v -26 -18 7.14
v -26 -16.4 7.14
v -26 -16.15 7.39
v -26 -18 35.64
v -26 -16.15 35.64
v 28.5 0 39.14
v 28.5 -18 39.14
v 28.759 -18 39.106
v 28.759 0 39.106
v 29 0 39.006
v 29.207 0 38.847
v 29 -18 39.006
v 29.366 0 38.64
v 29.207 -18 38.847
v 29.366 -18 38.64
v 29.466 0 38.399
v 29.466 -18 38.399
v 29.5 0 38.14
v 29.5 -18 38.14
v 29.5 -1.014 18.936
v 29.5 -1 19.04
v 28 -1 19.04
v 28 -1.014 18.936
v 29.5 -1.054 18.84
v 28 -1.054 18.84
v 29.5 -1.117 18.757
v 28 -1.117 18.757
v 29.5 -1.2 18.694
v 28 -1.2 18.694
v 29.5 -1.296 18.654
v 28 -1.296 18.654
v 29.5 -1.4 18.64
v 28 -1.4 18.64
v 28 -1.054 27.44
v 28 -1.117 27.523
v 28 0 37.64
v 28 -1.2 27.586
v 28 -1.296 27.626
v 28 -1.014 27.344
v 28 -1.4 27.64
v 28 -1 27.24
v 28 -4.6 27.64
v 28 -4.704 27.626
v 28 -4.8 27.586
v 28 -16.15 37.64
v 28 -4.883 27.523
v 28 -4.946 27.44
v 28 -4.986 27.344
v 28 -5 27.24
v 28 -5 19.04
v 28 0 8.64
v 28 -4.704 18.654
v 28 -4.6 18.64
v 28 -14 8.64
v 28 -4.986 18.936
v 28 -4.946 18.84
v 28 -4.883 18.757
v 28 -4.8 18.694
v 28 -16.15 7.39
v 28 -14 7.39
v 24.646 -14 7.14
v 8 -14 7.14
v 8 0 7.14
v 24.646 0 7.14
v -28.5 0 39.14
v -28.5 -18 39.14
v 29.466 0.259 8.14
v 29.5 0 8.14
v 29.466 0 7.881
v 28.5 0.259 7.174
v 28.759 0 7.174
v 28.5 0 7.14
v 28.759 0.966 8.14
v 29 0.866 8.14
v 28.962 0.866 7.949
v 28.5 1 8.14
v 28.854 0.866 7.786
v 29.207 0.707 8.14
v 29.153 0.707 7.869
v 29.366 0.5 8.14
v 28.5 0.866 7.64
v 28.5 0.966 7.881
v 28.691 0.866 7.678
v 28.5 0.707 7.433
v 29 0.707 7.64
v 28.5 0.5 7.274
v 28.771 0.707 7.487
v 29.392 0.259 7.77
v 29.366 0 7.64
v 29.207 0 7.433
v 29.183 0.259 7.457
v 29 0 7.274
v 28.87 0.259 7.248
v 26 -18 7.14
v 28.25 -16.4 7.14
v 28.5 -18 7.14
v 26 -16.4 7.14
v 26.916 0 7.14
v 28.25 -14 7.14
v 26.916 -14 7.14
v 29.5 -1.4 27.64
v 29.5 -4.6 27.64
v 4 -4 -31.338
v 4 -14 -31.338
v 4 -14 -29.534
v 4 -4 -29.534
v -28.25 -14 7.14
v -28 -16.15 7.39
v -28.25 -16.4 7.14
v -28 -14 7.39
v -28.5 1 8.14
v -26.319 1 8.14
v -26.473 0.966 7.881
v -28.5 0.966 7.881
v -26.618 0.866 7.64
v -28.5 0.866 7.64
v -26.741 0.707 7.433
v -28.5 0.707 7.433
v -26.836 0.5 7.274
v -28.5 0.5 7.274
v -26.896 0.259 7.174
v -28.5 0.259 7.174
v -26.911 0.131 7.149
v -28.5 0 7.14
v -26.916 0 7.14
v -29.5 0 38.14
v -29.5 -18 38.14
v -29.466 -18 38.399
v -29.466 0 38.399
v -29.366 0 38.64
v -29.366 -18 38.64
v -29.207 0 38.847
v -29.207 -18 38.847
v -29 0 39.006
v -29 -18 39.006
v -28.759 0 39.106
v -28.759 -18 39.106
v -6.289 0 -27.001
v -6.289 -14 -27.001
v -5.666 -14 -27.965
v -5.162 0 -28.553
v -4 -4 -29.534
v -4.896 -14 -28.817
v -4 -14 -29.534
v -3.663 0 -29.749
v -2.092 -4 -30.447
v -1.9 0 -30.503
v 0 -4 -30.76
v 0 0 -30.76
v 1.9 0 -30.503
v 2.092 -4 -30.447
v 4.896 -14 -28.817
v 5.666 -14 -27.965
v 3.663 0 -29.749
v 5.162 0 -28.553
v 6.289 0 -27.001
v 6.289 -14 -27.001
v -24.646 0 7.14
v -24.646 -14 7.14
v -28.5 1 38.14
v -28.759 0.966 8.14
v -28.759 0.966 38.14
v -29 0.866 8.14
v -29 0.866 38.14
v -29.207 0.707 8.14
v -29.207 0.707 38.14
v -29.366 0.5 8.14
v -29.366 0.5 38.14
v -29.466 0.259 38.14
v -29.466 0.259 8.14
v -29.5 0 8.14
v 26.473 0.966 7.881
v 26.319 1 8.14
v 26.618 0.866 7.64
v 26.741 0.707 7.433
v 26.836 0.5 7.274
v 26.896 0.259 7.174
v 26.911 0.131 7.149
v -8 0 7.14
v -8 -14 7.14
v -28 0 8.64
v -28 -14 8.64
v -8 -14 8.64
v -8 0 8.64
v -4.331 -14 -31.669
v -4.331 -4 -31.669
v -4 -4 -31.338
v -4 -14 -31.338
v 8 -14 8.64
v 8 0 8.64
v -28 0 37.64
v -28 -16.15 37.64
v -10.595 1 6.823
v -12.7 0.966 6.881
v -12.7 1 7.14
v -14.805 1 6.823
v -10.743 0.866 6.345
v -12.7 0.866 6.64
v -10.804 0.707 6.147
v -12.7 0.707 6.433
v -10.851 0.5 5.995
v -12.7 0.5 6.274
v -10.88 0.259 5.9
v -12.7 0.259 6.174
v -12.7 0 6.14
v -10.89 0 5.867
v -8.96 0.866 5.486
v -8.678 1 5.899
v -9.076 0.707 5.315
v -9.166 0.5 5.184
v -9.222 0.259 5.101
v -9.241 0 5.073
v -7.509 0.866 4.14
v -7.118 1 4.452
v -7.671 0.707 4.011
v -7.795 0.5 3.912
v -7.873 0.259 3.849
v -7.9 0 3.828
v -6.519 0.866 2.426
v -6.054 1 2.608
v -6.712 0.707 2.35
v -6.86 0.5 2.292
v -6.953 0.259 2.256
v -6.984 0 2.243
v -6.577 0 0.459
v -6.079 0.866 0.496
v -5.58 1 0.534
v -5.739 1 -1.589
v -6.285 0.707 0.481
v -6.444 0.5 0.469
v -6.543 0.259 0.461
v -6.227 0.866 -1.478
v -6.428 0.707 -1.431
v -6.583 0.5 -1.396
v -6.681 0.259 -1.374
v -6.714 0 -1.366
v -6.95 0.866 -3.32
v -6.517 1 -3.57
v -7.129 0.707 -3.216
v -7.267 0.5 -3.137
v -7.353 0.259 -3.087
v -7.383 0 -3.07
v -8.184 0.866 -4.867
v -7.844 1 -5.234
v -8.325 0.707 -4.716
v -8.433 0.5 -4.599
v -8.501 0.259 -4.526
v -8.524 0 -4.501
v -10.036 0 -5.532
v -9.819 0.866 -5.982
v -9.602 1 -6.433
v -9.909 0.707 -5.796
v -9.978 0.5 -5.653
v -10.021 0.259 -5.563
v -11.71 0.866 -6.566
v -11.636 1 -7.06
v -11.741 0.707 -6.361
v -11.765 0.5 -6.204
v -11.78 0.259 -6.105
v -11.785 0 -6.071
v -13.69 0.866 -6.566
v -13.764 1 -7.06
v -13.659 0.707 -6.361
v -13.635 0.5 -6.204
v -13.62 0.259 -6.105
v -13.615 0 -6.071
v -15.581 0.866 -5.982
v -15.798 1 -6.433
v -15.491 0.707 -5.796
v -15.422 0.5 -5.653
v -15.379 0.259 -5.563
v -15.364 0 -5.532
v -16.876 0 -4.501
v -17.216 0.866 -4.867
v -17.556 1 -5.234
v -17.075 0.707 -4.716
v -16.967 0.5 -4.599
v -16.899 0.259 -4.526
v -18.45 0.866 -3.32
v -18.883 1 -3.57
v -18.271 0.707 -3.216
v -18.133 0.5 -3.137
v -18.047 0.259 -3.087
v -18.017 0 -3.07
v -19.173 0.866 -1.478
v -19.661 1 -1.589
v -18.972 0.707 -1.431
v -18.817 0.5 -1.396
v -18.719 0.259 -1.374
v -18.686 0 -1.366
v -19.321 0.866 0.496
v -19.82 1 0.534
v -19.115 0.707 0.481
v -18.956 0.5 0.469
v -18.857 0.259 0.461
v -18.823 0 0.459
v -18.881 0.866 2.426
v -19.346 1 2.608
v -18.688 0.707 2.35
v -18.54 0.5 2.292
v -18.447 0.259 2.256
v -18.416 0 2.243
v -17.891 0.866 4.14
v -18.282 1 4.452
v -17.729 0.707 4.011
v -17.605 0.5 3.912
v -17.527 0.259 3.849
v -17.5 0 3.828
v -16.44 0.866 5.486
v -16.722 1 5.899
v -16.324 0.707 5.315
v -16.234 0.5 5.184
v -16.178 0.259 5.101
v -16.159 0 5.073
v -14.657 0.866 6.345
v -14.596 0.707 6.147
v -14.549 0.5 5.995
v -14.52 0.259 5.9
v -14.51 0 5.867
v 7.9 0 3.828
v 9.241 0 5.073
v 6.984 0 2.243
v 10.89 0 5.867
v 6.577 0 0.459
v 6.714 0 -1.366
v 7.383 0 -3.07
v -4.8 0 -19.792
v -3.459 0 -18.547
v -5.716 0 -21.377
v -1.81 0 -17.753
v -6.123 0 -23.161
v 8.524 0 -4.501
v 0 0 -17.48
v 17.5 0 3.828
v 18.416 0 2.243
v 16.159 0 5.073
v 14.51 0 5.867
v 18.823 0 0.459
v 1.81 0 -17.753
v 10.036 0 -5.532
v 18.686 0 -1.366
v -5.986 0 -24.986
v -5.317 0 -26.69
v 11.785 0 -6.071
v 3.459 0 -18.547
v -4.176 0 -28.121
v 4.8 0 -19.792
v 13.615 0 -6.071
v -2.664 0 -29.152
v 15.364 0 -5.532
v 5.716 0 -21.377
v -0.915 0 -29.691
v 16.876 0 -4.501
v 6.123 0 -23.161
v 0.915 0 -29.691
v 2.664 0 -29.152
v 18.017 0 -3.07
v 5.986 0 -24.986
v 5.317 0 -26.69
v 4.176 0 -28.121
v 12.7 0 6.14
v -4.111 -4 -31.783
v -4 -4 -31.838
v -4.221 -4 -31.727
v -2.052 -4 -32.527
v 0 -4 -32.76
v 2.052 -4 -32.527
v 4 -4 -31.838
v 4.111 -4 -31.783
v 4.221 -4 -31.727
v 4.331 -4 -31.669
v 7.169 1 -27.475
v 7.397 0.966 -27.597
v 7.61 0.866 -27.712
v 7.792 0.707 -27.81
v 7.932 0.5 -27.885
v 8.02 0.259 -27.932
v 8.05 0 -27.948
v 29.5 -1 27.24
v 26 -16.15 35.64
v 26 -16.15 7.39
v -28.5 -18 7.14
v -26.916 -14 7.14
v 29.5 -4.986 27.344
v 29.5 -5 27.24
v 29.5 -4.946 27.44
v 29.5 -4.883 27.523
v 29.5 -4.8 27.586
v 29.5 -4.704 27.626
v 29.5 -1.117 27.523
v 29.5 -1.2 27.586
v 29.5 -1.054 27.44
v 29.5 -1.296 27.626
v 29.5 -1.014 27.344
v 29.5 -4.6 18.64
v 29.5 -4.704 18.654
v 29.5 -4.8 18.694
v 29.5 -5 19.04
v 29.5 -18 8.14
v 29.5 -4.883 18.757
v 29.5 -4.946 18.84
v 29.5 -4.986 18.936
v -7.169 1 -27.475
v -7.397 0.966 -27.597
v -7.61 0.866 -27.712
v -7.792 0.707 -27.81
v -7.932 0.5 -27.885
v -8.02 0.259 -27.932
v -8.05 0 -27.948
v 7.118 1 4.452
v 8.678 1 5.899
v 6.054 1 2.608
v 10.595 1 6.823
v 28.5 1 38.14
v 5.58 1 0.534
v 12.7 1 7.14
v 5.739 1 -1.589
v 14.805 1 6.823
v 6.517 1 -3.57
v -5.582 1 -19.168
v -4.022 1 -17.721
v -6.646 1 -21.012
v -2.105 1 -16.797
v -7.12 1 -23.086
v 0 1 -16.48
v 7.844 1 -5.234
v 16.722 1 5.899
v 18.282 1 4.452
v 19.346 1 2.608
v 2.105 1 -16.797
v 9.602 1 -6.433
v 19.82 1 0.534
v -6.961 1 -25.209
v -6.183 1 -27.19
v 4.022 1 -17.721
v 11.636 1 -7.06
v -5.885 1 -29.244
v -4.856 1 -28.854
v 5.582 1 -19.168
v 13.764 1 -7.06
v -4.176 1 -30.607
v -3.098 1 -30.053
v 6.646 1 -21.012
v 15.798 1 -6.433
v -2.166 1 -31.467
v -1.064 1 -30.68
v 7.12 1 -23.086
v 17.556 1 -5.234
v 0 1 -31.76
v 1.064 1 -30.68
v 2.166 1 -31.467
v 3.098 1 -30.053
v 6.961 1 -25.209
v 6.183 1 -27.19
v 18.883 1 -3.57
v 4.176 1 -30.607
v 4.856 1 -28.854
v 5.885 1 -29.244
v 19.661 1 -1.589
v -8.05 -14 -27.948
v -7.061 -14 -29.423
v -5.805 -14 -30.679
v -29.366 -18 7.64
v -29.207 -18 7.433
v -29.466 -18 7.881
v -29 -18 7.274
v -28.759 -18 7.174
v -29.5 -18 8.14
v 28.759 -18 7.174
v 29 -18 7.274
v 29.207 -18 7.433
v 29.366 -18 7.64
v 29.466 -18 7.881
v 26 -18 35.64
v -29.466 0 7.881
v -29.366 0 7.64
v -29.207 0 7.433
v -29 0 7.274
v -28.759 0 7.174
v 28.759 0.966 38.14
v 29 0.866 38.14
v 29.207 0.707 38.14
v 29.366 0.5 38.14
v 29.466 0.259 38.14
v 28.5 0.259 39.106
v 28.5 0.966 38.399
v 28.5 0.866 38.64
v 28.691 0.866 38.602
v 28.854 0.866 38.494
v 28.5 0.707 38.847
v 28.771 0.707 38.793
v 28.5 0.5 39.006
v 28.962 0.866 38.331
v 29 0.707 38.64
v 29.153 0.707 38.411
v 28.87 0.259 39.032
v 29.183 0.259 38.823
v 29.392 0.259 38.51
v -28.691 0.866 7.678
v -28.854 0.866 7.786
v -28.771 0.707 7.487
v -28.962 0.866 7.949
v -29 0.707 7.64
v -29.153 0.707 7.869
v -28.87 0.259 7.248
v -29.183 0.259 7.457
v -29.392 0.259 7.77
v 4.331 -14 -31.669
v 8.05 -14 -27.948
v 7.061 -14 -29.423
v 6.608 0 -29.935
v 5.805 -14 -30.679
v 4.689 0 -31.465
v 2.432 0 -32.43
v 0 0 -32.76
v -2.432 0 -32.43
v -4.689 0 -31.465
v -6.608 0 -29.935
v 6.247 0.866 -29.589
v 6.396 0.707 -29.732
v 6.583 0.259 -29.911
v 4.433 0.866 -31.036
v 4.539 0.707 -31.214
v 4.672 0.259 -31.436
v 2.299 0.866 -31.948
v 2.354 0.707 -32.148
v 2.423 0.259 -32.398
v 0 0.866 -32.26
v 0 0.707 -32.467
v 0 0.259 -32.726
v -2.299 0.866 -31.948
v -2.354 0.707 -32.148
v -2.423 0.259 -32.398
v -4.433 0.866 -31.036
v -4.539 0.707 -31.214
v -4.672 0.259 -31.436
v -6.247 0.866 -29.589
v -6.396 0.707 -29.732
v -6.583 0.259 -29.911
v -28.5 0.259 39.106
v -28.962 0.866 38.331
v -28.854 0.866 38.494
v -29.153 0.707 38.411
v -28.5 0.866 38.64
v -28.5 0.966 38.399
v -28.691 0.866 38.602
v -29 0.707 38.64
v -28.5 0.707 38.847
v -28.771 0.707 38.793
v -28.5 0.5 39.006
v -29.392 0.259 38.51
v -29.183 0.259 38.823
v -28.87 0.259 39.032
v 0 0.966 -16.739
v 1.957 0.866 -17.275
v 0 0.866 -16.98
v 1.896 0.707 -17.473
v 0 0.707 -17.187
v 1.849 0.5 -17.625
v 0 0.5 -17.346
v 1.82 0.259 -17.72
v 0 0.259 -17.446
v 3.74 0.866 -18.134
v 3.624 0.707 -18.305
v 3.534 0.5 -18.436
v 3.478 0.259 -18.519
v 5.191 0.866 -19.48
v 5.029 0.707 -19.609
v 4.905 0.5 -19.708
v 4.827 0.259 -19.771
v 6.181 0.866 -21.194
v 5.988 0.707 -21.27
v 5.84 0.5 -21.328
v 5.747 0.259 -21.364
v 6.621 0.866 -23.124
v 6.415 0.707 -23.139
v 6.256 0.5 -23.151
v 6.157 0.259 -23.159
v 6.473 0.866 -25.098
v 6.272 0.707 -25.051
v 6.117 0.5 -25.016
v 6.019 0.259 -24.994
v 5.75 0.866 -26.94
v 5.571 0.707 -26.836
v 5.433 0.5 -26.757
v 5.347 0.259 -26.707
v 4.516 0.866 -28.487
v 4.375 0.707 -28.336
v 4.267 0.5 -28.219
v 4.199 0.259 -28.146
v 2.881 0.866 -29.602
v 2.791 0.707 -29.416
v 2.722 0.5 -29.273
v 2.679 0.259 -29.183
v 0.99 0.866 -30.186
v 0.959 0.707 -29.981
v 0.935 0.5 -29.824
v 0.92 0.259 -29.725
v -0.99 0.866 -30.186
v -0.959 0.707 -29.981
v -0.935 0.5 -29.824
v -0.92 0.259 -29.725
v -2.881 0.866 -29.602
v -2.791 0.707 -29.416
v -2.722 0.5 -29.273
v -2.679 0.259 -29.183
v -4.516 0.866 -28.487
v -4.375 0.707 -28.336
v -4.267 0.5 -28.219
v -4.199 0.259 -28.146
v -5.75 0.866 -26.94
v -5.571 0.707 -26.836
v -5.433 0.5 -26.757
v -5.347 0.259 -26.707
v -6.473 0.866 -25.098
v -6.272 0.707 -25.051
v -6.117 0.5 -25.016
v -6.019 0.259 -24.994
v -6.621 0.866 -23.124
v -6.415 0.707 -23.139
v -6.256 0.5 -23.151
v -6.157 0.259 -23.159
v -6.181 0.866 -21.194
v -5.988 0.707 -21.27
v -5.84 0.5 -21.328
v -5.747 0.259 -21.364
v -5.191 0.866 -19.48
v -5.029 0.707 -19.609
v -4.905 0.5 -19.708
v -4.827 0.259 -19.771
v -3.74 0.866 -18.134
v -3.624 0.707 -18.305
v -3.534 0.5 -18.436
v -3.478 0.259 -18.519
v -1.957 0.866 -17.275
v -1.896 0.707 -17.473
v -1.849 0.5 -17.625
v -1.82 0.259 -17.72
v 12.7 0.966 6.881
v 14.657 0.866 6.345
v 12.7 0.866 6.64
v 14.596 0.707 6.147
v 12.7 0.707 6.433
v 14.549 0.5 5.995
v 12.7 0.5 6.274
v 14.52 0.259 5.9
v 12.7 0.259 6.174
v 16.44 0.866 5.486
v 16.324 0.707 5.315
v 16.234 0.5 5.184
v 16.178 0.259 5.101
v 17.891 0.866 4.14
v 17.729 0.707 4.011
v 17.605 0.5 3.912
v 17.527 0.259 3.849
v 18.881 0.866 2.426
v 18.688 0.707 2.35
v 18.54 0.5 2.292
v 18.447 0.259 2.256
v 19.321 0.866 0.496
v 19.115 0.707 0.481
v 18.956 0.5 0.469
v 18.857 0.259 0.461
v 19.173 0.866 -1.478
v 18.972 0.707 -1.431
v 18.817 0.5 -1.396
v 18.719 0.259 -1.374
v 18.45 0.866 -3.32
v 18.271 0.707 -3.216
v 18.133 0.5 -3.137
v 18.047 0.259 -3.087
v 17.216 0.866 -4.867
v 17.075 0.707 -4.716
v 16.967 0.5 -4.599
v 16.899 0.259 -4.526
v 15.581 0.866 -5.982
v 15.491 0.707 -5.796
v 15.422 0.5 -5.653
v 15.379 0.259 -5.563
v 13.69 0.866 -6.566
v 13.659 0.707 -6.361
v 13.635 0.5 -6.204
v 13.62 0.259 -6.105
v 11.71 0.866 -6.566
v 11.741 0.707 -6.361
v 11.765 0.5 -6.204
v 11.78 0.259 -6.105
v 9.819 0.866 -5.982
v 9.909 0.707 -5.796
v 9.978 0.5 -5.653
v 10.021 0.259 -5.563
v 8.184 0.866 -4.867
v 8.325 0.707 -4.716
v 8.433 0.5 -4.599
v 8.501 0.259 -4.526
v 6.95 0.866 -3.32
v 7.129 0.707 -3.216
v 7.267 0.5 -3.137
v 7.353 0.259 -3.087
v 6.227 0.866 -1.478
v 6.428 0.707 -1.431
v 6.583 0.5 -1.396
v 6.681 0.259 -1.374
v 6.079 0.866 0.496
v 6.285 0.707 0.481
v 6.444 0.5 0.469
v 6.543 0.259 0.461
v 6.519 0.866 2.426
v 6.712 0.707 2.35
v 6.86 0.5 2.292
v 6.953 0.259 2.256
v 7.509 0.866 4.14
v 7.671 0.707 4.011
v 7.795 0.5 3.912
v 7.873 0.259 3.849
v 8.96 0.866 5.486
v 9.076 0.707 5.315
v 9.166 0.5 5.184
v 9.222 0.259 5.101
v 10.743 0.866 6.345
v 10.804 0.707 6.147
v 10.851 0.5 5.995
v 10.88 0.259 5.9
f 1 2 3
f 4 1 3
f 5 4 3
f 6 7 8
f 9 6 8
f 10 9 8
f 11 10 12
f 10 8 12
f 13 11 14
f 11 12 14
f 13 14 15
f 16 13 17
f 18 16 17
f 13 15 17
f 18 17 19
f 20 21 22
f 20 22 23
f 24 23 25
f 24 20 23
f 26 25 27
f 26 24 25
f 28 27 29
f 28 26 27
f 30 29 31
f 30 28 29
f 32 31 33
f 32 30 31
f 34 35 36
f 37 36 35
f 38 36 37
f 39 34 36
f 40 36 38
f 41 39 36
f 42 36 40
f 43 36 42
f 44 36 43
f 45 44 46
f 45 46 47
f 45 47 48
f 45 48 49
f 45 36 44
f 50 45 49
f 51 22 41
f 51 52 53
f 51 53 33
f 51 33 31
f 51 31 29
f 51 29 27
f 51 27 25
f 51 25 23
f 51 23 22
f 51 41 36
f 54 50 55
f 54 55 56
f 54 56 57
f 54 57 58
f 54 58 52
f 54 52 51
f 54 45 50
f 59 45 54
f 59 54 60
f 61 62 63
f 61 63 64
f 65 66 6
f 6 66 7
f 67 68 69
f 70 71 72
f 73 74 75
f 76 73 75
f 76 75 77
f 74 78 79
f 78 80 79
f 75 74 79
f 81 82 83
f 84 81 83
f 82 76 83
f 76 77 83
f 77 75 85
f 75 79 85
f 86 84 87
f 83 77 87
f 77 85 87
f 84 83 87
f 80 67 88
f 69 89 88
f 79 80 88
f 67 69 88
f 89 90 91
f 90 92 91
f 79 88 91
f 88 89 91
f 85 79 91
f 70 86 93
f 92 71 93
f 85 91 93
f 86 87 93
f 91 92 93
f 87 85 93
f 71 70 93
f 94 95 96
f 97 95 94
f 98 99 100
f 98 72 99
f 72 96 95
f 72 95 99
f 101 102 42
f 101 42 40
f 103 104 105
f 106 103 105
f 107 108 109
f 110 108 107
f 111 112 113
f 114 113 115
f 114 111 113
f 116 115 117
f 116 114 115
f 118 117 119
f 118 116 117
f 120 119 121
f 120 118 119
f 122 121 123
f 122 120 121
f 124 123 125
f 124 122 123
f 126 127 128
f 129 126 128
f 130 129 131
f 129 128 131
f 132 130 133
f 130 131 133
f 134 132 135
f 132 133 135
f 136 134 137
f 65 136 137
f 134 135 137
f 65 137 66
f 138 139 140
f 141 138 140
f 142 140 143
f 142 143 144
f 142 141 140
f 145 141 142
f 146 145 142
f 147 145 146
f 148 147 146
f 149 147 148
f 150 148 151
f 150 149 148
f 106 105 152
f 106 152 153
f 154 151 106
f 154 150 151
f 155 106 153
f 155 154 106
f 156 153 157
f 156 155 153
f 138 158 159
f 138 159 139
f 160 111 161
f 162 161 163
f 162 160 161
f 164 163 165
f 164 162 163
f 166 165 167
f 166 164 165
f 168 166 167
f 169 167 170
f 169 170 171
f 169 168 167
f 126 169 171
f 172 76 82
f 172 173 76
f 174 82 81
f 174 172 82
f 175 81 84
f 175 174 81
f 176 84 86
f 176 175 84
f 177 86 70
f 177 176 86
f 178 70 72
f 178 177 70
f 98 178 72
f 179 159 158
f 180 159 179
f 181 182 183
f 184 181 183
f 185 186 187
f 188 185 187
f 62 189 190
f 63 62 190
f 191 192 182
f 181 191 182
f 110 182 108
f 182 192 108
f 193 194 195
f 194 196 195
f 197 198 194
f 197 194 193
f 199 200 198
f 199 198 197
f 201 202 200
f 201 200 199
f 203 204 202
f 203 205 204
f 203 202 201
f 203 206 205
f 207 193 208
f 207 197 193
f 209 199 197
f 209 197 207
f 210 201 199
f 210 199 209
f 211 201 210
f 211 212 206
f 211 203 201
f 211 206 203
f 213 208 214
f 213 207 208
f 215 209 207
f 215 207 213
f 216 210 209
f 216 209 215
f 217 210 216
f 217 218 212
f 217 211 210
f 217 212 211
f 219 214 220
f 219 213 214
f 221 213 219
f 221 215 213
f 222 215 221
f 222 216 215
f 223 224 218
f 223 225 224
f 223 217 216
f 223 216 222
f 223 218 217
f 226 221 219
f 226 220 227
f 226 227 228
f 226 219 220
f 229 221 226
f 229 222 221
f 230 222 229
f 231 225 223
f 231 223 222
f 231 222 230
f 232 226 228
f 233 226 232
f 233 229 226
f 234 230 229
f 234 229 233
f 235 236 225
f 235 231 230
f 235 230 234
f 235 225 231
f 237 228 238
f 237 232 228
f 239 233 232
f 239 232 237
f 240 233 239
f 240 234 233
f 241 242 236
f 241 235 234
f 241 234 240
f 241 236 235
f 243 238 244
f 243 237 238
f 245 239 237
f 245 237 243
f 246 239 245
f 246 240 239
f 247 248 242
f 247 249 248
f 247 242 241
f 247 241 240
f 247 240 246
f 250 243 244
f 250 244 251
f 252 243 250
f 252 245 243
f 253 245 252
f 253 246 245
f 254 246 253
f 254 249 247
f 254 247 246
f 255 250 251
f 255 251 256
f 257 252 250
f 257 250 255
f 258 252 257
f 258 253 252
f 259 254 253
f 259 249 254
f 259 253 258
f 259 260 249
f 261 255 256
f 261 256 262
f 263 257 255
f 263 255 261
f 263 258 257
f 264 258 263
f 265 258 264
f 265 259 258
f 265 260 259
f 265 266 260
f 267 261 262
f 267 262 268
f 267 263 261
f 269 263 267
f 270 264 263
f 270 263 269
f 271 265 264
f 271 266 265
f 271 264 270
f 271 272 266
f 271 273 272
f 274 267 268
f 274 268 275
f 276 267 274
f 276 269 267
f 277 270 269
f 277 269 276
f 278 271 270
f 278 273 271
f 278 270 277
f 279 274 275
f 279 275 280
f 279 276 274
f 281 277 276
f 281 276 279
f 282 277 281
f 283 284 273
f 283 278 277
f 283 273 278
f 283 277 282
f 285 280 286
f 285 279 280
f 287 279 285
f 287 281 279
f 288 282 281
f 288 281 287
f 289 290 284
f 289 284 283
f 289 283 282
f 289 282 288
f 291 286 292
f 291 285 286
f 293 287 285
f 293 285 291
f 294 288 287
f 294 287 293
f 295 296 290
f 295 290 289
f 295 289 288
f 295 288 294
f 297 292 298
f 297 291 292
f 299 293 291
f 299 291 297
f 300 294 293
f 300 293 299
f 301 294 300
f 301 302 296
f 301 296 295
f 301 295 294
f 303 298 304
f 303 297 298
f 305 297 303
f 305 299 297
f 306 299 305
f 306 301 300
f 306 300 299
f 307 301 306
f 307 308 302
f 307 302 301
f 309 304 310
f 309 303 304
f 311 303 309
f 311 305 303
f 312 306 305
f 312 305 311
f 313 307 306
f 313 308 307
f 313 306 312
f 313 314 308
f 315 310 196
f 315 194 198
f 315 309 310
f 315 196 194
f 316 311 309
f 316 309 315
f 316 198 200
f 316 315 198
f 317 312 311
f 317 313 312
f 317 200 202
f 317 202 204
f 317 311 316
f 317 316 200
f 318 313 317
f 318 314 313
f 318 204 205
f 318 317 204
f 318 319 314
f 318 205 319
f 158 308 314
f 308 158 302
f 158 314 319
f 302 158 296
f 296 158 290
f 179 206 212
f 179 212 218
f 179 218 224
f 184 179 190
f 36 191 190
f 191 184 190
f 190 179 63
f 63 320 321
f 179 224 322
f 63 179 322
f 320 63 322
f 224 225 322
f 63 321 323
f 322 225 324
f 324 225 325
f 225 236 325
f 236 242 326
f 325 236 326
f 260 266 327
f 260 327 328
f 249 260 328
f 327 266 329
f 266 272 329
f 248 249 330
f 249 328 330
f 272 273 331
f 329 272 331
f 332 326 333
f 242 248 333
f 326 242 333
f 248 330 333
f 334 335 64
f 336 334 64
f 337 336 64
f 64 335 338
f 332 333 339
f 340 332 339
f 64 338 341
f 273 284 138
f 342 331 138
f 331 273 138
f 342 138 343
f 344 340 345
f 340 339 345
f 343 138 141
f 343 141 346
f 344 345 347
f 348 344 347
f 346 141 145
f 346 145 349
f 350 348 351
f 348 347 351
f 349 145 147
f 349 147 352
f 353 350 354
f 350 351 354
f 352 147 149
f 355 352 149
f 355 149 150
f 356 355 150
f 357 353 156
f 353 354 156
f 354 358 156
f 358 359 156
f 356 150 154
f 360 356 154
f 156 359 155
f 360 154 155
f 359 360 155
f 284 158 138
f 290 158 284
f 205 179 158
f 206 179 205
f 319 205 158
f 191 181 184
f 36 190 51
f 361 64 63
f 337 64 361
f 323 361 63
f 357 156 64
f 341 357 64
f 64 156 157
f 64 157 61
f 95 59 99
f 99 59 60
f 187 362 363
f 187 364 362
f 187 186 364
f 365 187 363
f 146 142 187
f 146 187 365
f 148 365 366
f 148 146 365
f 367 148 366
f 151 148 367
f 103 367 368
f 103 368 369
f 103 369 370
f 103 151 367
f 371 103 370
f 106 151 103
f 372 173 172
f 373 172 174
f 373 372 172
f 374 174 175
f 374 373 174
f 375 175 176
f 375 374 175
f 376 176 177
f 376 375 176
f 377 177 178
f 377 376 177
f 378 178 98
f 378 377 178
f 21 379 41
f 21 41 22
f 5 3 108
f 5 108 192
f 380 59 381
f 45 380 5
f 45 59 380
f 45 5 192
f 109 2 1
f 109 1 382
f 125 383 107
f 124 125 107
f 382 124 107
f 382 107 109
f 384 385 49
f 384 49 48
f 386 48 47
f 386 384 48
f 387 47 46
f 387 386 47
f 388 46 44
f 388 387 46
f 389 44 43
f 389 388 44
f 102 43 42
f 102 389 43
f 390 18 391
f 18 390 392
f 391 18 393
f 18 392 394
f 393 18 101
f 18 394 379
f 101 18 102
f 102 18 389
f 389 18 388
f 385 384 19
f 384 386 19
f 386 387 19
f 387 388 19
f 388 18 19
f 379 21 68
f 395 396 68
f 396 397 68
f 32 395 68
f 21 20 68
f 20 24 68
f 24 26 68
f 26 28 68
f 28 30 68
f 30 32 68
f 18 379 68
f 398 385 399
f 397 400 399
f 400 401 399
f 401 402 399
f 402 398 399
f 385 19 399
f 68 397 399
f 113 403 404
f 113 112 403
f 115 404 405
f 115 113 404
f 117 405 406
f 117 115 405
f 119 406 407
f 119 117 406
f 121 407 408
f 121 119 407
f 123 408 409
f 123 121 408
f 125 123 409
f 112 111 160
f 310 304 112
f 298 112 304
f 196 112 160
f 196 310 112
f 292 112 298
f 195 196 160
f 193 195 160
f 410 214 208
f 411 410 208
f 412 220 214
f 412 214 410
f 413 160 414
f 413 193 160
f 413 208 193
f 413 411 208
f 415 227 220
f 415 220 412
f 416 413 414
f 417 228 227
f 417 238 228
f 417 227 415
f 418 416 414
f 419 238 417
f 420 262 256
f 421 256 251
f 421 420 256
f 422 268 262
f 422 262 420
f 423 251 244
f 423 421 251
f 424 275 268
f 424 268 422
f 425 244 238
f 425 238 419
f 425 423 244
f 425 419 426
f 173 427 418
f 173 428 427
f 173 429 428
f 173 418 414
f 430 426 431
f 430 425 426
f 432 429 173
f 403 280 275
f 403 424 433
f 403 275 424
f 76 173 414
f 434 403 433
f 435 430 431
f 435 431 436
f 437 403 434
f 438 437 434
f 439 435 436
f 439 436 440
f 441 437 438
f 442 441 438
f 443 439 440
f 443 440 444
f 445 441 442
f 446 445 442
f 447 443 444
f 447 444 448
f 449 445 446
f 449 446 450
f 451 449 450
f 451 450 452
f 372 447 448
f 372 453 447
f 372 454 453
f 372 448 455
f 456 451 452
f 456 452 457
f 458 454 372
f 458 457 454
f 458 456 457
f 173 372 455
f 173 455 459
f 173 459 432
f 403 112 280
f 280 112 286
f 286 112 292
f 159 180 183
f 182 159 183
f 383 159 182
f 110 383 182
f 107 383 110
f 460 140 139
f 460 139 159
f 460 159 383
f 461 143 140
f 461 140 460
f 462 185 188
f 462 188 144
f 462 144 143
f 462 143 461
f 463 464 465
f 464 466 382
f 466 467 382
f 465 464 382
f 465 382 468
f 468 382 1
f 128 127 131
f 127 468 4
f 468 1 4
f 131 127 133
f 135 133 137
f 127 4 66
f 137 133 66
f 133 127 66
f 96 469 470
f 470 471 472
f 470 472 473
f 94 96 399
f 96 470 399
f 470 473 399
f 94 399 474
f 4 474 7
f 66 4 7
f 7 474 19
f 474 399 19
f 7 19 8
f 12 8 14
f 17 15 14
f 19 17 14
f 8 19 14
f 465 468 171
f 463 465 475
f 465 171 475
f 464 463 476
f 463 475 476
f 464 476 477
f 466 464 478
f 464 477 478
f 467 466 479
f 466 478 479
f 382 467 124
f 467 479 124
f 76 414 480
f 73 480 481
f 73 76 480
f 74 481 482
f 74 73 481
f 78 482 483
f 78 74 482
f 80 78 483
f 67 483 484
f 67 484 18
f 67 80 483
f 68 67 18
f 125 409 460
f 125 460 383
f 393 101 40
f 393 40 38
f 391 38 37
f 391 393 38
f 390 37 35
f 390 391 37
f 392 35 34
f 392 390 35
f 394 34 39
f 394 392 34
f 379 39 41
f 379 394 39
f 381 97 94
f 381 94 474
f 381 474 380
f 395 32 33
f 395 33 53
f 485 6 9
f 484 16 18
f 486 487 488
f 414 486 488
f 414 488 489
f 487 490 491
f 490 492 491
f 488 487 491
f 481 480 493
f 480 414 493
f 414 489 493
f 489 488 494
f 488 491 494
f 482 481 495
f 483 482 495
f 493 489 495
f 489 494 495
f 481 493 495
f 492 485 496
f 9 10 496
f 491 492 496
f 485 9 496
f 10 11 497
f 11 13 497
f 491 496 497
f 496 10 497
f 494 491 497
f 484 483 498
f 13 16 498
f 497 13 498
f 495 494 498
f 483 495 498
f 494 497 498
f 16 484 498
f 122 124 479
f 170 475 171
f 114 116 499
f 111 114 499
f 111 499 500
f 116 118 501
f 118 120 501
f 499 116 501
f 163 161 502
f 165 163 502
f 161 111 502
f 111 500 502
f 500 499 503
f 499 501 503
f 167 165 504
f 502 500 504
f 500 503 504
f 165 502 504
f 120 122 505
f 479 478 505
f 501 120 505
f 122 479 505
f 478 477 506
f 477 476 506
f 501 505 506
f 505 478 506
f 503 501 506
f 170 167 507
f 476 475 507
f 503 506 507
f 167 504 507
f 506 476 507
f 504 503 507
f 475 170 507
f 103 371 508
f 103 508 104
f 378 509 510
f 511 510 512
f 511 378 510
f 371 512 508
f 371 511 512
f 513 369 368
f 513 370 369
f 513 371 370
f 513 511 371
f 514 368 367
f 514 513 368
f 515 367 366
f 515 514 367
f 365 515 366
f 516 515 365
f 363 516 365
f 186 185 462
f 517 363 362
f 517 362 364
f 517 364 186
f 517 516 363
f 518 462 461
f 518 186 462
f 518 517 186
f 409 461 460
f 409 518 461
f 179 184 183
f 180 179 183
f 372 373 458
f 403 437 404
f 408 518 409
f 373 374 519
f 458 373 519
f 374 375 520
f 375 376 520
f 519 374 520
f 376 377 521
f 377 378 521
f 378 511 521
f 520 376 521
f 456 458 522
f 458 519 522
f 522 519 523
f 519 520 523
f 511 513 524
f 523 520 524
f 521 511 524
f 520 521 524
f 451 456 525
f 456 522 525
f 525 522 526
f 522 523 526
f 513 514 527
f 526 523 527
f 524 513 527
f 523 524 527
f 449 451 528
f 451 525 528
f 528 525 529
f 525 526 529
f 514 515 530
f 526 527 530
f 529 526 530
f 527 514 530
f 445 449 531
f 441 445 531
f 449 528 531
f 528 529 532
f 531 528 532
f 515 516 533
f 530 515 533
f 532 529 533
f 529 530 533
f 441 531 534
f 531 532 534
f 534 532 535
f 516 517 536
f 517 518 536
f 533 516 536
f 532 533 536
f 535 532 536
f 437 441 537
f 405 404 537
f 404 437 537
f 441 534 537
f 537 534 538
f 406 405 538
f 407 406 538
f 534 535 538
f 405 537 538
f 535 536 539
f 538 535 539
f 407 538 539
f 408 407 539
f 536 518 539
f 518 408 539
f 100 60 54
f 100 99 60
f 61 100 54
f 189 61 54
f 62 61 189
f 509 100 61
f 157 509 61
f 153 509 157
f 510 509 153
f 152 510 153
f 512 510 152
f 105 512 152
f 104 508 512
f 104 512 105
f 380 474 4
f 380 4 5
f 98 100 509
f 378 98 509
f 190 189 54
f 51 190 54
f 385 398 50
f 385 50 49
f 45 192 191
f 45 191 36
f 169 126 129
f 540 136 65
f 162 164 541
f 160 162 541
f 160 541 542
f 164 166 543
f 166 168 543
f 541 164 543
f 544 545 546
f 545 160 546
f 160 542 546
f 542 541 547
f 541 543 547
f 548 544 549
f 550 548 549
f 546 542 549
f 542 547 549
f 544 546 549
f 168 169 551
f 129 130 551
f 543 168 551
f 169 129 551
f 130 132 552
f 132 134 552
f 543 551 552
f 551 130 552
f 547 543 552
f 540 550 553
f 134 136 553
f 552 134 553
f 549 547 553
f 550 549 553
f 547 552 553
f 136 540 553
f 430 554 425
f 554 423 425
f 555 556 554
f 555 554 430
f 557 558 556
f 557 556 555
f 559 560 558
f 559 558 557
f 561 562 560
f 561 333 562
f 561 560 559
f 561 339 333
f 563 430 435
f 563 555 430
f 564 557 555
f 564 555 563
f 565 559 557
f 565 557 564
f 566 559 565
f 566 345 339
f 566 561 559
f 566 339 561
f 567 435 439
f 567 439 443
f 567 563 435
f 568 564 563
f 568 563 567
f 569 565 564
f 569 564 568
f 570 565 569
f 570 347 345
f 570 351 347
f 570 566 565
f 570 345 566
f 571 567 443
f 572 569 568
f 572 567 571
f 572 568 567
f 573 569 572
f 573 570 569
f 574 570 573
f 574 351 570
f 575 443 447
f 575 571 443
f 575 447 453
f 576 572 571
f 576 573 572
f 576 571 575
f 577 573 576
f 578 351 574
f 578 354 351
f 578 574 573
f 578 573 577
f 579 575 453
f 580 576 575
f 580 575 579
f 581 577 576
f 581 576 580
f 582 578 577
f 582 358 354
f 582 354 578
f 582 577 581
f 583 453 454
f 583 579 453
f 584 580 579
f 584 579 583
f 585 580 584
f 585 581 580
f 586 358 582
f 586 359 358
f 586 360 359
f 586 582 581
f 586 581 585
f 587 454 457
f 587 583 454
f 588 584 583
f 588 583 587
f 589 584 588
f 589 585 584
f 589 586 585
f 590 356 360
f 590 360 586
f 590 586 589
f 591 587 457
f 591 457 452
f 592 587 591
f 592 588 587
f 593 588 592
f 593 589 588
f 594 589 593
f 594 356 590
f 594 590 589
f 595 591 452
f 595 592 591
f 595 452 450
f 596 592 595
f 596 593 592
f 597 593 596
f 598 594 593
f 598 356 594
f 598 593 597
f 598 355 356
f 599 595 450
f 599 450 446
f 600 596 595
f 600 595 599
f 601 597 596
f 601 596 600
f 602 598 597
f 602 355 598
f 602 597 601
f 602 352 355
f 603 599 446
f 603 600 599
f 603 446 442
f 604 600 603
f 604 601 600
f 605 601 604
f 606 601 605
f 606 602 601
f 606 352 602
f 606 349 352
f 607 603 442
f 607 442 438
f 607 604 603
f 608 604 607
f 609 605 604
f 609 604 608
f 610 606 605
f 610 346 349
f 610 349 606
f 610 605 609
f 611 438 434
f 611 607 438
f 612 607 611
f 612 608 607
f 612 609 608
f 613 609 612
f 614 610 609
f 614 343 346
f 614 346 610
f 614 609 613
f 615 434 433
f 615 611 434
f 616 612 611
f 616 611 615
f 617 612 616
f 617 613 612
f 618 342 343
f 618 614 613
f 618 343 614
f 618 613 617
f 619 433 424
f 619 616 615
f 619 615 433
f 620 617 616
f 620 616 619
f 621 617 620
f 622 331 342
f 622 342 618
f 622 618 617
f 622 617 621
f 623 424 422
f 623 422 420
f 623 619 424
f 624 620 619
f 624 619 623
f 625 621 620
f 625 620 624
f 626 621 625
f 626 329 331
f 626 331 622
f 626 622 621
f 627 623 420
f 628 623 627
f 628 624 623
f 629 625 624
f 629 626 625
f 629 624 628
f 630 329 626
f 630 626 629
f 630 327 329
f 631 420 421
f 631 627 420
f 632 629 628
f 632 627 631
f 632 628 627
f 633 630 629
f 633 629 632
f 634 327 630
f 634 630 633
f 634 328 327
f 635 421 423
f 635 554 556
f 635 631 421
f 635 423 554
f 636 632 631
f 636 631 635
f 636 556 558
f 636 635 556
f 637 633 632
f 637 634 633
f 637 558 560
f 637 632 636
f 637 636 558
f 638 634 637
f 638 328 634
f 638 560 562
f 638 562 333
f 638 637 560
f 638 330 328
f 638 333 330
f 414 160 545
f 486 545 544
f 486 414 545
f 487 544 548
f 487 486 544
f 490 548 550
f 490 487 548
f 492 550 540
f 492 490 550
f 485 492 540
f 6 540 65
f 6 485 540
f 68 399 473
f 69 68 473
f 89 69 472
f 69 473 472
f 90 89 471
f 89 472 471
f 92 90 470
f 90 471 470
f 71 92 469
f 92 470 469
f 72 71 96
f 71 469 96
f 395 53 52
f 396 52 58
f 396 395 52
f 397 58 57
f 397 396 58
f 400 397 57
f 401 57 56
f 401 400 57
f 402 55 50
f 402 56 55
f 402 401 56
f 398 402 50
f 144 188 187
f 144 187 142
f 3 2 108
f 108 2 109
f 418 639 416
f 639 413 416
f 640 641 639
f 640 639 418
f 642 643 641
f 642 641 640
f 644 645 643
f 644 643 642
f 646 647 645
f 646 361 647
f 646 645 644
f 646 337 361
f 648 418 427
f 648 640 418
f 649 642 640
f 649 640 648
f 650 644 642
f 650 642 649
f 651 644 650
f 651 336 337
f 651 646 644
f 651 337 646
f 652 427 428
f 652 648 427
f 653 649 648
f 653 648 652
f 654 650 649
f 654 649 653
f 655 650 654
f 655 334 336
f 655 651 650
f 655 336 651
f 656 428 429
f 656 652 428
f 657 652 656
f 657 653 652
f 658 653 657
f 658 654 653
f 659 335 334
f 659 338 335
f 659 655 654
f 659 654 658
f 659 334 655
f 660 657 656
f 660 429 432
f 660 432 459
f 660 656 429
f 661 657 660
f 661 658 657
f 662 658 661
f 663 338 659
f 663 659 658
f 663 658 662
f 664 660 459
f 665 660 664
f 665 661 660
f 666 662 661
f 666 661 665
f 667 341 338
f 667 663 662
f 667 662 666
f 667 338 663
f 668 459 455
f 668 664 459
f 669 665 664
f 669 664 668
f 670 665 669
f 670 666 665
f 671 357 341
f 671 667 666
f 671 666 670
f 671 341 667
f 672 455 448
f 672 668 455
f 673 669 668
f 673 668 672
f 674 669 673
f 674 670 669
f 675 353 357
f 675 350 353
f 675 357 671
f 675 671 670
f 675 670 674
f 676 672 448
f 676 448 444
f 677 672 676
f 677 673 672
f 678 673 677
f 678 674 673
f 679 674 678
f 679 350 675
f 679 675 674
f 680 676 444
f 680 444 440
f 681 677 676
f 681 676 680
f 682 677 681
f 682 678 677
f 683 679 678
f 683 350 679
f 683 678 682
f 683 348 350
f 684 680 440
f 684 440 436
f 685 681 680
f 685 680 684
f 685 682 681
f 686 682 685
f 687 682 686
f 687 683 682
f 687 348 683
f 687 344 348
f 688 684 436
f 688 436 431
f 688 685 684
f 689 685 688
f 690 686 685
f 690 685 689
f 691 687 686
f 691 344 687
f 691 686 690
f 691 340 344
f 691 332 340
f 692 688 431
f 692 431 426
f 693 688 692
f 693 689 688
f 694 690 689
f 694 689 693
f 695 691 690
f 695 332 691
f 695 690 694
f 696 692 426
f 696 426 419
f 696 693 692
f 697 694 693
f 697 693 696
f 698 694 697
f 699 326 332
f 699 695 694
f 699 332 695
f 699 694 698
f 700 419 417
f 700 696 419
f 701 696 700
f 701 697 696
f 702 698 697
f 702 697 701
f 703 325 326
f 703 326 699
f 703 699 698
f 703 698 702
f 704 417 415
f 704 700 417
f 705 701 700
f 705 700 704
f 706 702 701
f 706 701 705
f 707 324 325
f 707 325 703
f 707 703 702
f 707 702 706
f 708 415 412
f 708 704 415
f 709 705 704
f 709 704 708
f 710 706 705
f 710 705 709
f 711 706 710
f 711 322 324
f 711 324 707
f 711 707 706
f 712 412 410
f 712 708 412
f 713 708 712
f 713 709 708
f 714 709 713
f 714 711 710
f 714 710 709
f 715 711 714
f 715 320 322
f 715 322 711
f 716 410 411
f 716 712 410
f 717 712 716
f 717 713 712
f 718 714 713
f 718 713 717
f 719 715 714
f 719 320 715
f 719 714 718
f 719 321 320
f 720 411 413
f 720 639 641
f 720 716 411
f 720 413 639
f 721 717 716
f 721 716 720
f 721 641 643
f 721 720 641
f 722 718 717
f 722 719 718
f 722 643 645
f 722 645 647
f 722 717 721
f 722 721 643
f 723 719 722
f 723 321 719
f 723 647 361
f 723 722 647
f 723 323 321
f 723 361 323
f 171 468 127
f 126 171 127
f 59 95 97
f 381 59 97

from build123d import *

# Parameters (mm, degrees)
SKETCH1_R           = 6.14
BOSS_EXTRUDE1_DEPTH = 1
BOSS_EXTRUDE2_START = -18
SKETCH1_7_R         = 6.14
SKETCH1_7_W         = 59
SKETCH1_7_H         = 32
SKETCH1_7_W_2       = 56
SKETCH1_7_H_2       = 29
BOSS_EXTRUDE2_DEPTH = 18
BOSS_EXTRUDE4_DEPTH = 14
FILLET1_R           = 1
CUT_EXTRUDE2_DEPTH  = 14
CUT_EXTRUDE3_DEPTH  = 14
FILLET2_R           = 1
SKETCH24_W          = 56
SKETCH24_H          = 1.5
CUT_EXTRUDE5_DEPTH  = 4
BOSS_EXTRUDE5_REACH = 54.785
SKETCH26_W          = 2
SKETCH26_H          = 1.85
BOSS_EXTRUDE6_REACH = 72.258
SKETCH27_W          = 2
SKETCH27_H          = 1.85
SKETCH29_W          = 8
SKETCH29_H          = 5
CUT_EXTRUDE7_DEPTH  = 10
CHAMFER1_SIZE       = 0.5
CHAMFER2_SIZE       = 0.25


# Some blends are built 0.0001 mm under size
with BuildPart() as part:
    # Sketch1 → Boss-Extrude1 (new body)
    with BuildSketch(Plane(origin=(0, 0, 0), x_dir=(1, 0, 0), z_dir=(0, 1, 0))):
        with BuildLine():
            Line((26.916456077, -7.14), (8.050130866, 27.948393818))
            ThreePointArc((8.050130866, 27.948393818), (0, 32.76), (-8.050130866, 27.948393818))
            Line((-8.050130866, 27.948393818), (-26.916456077, -7.14))
            Line((-26.916456077, -7.14), (-29.5, -7.14))
            Line((-29.5, -7.14), (-29.5, -39.14))
            Line((-29.5, -39.14), (29.5, -39.14))
            Line((29.5, -39.14), (29.5, -7.14))
            Line((29.5, -7.14), (26.916456077, -7.14))
        make_face()
        with Locations(Location((-12.7, 0, 0), (0, 0, 270))):
            Circle(SKETCH1_R, mode=Mode.SUBTRACT)
        with Locations(Location((0, 23.62, 0), (0, 0, 270))):
            Circle(SKETCH1_R, mode=Mode.SUBTRACT)
        with Locations(Location((12.7, 0, 0), (0, 0, 270))):
            Circle(SKETCH1_R, mode=Mode.SUBTRACT)
    extrude(amount=BOSS_EXTRUDE1_DEPTH)

    # Sketch1<7> → Boss-Extrude2 (add)
    # profile 1 of 4: a face of its own
    with BuildSketch(Plane(origin=(0, 0, 0), x_dir=(1, 0, 0), z_dir=(0, 1, 0)).offset(BOSS_EXTRUDE2_START)):
        with Locations(Location((-12.7, 0, 0), (0, 0, 270))):
            Circle(SKETCH1_7_R)
    # profile 2 of 4: a face of its own
    with BuildSketch(Plane(origin=(0, 0, 0), x_dir=(1, 0, 0), z_dir=(0, 1, 0)).offset(BOSS_EXTRUDE2_START)):
        with Locations(Location((0, 23.62, 0), (0, 0, 270))):
            Circle(SKETCH1_7_R)
    # profile 3 of 4: a face of its own
    with BuildSketch(Plane(origin=(0, 0, 0), x_dir=(1, 0, 0), z_dir=(0, 1, 0)).offset(BOSS_EXTRUDE2_START)):
        with Locations(Location((12.7, 0, 0), (0, 0, 270))):
            Circle(SKETCH1_7_R)
    # profile 4 of 4: a face of its own
    with BuildSketch(Plane(origin=(0, 0, 0), x_dir=(1, 0, 0), z_dir=(0, 1, 0)).offset(BOSS_EXTRUDE2_START)):
        with Locations((0, -23.14)):
            Rectangle(SKETCH1_7_W, SKETCH1_7_H)
        with Locations((0, -23.14)):
            Rectangle(SKETCH1_7_W_2, SKETCH1_7_H_2, mode=Mode.SUBTRACT)
    extrude(amount=BOSS_EXTRUDE2_DEPTH)


with BuildPart() as boss_extrude2_kept_piece:
    # of the separate pieces the step leaves, the one the design keeps (boss_extrude2_pieces_kept)
    add(part.part.solids().sort_by_distance((26.916456077, 0, 7.14))[0])

    # Sketch16 → Boss-Extrude4 (add)
    with BuildSketch(Plane.XZ):
        with BuildLine():
            Line((-24.645685539, 7.14), (-6.288614265, -27.001261692))
            ThreePointArc((-6.288614265, -27.001261692), (0, -30.76), (6.288614265, -27.001261692))
            Line((6.288614265, -27.001261692), (24.645685539, 7.14))
            Line((24.645685539, 7.14), (26.916456077, 7.14))
            Line((26.916456077, 7.14), (8.050130866, -27.948393818))
            ThreePointArc((8.050130866, -27.948393818), (0, -32.76), (-8.050130866, -27.948393818))
            Line((-8.050130866, -27.948393818), (-26.916456077, 7.14))
            Line((-26.916456077, 7.14), (-24.645685539, 7.14))
        make_face()
    extrude(amount=BOSS_EXTRUDE4_DEPTH)

    # Fillet1
    fillet1_edges = [boss_extrude2_kept_piece.edges().sort_by_distance(p)[0] for p in [
        (-29.5, -8.5, 7.14),
        (29.5, -8.5, 7.14),
        (29.5, -8.5, 39.14),
        (-29.5, -8.5, 39.14),
    ]]
    fillet(fillet1_edges, radius=FILLET1_R)

    # Sketch19 → Cut-Extrude2 (cut)
    with BuildSketch(Plane(origin=(29.5, 0, 0), x_dir=(0, 0, -1), z_dir=(1, 0, 0))):
        with BuildLine():
            Line((-27.24, -1), (-19.04, -1))
            ThreePointArc((-19.04, -1), (-18.757157288, -1.117157288), (-18.64, -1.4))
            Line((-18.64, -1.4), (-18.64, -4.6))
            ThreePointArc((-18.64, -4.6), (-18.757157288, -4.882842712), (-19.04, -5))
            Line((-19.04, -5), (-27.24, -5))
            ThreePointArc((-27.24, -5), (-27.522842712, -4.882842712), (-27.64, -4.6))
            Line((-27.64, -4.6), (-27.64, -1.4))
            ThreePointArc((-27.64, -1.4), (-27.522842712, -1.117157288), (-27.24, -1))
        make_face()
    extrude(amount=-CUT_EXTRUDE2_DEPTH, mode=Mode.SUBTRACT)

    # Sketch21 → Cut-Extrude3 (cut)
    with BuildSketch(Plane.XY.offset(8.64)):
        Polygon((8, 0), (-8, 0), (-8, -5.911265283), (-8, -14), (8, -14), (8, -5.911265283), align=None)
    extrude(amount=-CUT_EXTRUDE3_DEPTH, mode=Mode.SUBTRACT)

    # Fillet2
    fillet2_edges = [boss_extrude2_kept_piece.edges().sort_by_distance(p)[0] for p in [
        (0, 1, 39.14),
        (-29.5, 1, 23.14),
        (29.5, 1, 23.14),
        (-27.708228038, 1, 7.14),
        (29.207106781, 1, 7.432893219),
        (29.207106781, 1, 38.847106781),
        (-29.207106781, 1, 7.432893219),
        (-29.207106781, 1, 38.847106781),
        (27.708228038, 1, 7.14),
        (17.483293471, 1, -10.404196909),
        (0, 1, -32.76),
        (-17.483293471, 1, -10.404196909),
        (-12.7, 1, -6.14),
        (0, 1, -29.76),
        (12.7, 1, -6.14),
    ]]
    fillet(fillet2_edges, radius=FILLET2_R - 0.0001)  # a hair under: the kernel refuses the full size

    # Sketch24 → Cut-Extrude5 (cut)
    with BuildSketch(Plane(origin=(0, -18, 0), x_dir=(-1, 0, 0), z_dir=(0, -1, 0))):
        with Locations((0, -7.89)):
            Rectangle(SKETCH24_W, SKETCH24_H)
    extrude(amount=-CUT_EXTRUDE5_DEPTH, mode=Mode.SUBTRACT)

    # Sketch26 → Boss-Extrude5 (add, up to next)
    with BuildSketch(Plane(origin=(0, 0, 7.14), x_dir=(-1, 0, 0), z_dir=(0, 0, -1)), mode=Mode.PRIVATE) as boss_extrude5_sk1:
        with Locations((27, -17.075)):
            Rectangle(SKETCH26_W, SKETCH26_H)
    boss_extrude5_tool1 = extrude(boss_extrude5_sk1.sketch, amount=-BOSS_EXTRUDE5_REACH, mode=Mode.PRIVATE) - boss_extrude2_kept_piece.part
    # Sketch26 → Boss-Extrude5 (add, up to next)
    with BuildSketch(Plane(origin=(0, 0, 7.14), x_dir=(-1, 0, 0), z_dir=(0, 0, -1)), mode=Mode.PRIVATE) as boss_extrude5_sk2:
        with Locations((-27, -17.075)):
            Rectangle(SKETCH26_W, SKETCH26_H)
    boss_extrude5_tool2 = extrude(boss_extrude5_sk2.sketch, amount=-BOSS_EXTRUDE5_REACH, mode=Mode.PRIVATE) - boss_extrude2_kept_piece.part
    add(boss_extrude5_tool1.solids().sort_by_distance((-27, -17.075, 7.14))[0])
    add(boss_extrude5_tool2.solids().sort_by_distance((27, -17.075, 7.14))[0])

    # Sketch27 → Boss-Extrude6 (add, up to next)
    with BuildSketch(Plane.ZY.offset(-26), mode=Mode.PRIVATE) as boss_extrude6_sk1:
        with Locations((36.64, -17.075)):
            Rectangle(SKETCH27_W, SKETCH27_H)
    boss_extrude6_tool1 = extrude(boss_extrude6_sk1.sketch, amount=BOSS_EXTRUDE6_REACH, mode=Mode.PRIVATE) - boss_extrude2_kept_piece.part
    add(boss_extrude6_tool1.solids().sort_by_distance((26, -17.075, 36.64))[0])

    # Sketch29 → Cut-Extrude7 (cut)
    with BuildSketch(Plane.XZ.offset(14)):
        with Locations((0, -32.034355417)):
            Rectangle(SKETCH29_W, SKETCH29_H)
    extrude(amount=-CUT_EXTRUDE7_DEPTH, mode=Mode.SUBTRACT)

    # Chamfer1
    # the kernel refuses this chamfer: 0.5, 0.374030712 mm, written as the material it takes off along each edge
    with BuildSketch(Plane(origin=(-4, -4, -31.838247988), x_dir=(-0.89007215049111, 0, 0.4558196649116082), z_dir=(0, -1, 0))) as chamfer1_piece_1:
        with BuildLine():
            Line((0.371500885, 0), (CHAMFER1_SIZE * 0.455819664912, -CHAMFER1_SIZE * 0.890072150491))
            Line((CHAMFER1_SIZE * 0.455819664912, -CHAMFER1_SIZE * 0.890072150491), (0, 0))
            ThreePointArc((0, 0), (0.18881851, 0.001887165), (0.371500885, 0))
        make_face()
    extrude(amount=11.285841494, mode=Mode.SUBTRACT)
    with BuildSketch(Plane(origin=(4, -4, -31.838247988), x_dir=(0.8900721504911105, 0, 0.4558196649116072), z_dir=(0, -1, 0))) as chamfer1_piece_2:
        with BuildLine():
            Line((0.371500885, 0), (CHAMFER1_SIZE * 0.455819664912, CHAMFER1_SIZE * 0.890072150491))
            Line((CHAMFER1_SIZE * 0.455819664912, CHAMFER1_SIZE * 0.890072150491), (0, 0))
            ThreePointArc((0, 0), (0.18881851, -0.001887165), (0.371500885, 0))
        make_face()
    extrude(amount=11.285841494, mode=Mode.SUBTRACT)

    # Chamfer2
    chamfer2_edges = [boss_extrude2_kept_piece.edges().sort_by_distance(p)[0] for p in [
        (28, -15.075, 7.14),
        (-28, -15.075, 7.14),
        (-27, -16.15, 7.14),
        (27, -16.15, 7.14),
    ]]
    chamfer(chamfer2_edges, length=CHAMFER2_SIZE)


solid = boss_extrude2_kept_piece.part
